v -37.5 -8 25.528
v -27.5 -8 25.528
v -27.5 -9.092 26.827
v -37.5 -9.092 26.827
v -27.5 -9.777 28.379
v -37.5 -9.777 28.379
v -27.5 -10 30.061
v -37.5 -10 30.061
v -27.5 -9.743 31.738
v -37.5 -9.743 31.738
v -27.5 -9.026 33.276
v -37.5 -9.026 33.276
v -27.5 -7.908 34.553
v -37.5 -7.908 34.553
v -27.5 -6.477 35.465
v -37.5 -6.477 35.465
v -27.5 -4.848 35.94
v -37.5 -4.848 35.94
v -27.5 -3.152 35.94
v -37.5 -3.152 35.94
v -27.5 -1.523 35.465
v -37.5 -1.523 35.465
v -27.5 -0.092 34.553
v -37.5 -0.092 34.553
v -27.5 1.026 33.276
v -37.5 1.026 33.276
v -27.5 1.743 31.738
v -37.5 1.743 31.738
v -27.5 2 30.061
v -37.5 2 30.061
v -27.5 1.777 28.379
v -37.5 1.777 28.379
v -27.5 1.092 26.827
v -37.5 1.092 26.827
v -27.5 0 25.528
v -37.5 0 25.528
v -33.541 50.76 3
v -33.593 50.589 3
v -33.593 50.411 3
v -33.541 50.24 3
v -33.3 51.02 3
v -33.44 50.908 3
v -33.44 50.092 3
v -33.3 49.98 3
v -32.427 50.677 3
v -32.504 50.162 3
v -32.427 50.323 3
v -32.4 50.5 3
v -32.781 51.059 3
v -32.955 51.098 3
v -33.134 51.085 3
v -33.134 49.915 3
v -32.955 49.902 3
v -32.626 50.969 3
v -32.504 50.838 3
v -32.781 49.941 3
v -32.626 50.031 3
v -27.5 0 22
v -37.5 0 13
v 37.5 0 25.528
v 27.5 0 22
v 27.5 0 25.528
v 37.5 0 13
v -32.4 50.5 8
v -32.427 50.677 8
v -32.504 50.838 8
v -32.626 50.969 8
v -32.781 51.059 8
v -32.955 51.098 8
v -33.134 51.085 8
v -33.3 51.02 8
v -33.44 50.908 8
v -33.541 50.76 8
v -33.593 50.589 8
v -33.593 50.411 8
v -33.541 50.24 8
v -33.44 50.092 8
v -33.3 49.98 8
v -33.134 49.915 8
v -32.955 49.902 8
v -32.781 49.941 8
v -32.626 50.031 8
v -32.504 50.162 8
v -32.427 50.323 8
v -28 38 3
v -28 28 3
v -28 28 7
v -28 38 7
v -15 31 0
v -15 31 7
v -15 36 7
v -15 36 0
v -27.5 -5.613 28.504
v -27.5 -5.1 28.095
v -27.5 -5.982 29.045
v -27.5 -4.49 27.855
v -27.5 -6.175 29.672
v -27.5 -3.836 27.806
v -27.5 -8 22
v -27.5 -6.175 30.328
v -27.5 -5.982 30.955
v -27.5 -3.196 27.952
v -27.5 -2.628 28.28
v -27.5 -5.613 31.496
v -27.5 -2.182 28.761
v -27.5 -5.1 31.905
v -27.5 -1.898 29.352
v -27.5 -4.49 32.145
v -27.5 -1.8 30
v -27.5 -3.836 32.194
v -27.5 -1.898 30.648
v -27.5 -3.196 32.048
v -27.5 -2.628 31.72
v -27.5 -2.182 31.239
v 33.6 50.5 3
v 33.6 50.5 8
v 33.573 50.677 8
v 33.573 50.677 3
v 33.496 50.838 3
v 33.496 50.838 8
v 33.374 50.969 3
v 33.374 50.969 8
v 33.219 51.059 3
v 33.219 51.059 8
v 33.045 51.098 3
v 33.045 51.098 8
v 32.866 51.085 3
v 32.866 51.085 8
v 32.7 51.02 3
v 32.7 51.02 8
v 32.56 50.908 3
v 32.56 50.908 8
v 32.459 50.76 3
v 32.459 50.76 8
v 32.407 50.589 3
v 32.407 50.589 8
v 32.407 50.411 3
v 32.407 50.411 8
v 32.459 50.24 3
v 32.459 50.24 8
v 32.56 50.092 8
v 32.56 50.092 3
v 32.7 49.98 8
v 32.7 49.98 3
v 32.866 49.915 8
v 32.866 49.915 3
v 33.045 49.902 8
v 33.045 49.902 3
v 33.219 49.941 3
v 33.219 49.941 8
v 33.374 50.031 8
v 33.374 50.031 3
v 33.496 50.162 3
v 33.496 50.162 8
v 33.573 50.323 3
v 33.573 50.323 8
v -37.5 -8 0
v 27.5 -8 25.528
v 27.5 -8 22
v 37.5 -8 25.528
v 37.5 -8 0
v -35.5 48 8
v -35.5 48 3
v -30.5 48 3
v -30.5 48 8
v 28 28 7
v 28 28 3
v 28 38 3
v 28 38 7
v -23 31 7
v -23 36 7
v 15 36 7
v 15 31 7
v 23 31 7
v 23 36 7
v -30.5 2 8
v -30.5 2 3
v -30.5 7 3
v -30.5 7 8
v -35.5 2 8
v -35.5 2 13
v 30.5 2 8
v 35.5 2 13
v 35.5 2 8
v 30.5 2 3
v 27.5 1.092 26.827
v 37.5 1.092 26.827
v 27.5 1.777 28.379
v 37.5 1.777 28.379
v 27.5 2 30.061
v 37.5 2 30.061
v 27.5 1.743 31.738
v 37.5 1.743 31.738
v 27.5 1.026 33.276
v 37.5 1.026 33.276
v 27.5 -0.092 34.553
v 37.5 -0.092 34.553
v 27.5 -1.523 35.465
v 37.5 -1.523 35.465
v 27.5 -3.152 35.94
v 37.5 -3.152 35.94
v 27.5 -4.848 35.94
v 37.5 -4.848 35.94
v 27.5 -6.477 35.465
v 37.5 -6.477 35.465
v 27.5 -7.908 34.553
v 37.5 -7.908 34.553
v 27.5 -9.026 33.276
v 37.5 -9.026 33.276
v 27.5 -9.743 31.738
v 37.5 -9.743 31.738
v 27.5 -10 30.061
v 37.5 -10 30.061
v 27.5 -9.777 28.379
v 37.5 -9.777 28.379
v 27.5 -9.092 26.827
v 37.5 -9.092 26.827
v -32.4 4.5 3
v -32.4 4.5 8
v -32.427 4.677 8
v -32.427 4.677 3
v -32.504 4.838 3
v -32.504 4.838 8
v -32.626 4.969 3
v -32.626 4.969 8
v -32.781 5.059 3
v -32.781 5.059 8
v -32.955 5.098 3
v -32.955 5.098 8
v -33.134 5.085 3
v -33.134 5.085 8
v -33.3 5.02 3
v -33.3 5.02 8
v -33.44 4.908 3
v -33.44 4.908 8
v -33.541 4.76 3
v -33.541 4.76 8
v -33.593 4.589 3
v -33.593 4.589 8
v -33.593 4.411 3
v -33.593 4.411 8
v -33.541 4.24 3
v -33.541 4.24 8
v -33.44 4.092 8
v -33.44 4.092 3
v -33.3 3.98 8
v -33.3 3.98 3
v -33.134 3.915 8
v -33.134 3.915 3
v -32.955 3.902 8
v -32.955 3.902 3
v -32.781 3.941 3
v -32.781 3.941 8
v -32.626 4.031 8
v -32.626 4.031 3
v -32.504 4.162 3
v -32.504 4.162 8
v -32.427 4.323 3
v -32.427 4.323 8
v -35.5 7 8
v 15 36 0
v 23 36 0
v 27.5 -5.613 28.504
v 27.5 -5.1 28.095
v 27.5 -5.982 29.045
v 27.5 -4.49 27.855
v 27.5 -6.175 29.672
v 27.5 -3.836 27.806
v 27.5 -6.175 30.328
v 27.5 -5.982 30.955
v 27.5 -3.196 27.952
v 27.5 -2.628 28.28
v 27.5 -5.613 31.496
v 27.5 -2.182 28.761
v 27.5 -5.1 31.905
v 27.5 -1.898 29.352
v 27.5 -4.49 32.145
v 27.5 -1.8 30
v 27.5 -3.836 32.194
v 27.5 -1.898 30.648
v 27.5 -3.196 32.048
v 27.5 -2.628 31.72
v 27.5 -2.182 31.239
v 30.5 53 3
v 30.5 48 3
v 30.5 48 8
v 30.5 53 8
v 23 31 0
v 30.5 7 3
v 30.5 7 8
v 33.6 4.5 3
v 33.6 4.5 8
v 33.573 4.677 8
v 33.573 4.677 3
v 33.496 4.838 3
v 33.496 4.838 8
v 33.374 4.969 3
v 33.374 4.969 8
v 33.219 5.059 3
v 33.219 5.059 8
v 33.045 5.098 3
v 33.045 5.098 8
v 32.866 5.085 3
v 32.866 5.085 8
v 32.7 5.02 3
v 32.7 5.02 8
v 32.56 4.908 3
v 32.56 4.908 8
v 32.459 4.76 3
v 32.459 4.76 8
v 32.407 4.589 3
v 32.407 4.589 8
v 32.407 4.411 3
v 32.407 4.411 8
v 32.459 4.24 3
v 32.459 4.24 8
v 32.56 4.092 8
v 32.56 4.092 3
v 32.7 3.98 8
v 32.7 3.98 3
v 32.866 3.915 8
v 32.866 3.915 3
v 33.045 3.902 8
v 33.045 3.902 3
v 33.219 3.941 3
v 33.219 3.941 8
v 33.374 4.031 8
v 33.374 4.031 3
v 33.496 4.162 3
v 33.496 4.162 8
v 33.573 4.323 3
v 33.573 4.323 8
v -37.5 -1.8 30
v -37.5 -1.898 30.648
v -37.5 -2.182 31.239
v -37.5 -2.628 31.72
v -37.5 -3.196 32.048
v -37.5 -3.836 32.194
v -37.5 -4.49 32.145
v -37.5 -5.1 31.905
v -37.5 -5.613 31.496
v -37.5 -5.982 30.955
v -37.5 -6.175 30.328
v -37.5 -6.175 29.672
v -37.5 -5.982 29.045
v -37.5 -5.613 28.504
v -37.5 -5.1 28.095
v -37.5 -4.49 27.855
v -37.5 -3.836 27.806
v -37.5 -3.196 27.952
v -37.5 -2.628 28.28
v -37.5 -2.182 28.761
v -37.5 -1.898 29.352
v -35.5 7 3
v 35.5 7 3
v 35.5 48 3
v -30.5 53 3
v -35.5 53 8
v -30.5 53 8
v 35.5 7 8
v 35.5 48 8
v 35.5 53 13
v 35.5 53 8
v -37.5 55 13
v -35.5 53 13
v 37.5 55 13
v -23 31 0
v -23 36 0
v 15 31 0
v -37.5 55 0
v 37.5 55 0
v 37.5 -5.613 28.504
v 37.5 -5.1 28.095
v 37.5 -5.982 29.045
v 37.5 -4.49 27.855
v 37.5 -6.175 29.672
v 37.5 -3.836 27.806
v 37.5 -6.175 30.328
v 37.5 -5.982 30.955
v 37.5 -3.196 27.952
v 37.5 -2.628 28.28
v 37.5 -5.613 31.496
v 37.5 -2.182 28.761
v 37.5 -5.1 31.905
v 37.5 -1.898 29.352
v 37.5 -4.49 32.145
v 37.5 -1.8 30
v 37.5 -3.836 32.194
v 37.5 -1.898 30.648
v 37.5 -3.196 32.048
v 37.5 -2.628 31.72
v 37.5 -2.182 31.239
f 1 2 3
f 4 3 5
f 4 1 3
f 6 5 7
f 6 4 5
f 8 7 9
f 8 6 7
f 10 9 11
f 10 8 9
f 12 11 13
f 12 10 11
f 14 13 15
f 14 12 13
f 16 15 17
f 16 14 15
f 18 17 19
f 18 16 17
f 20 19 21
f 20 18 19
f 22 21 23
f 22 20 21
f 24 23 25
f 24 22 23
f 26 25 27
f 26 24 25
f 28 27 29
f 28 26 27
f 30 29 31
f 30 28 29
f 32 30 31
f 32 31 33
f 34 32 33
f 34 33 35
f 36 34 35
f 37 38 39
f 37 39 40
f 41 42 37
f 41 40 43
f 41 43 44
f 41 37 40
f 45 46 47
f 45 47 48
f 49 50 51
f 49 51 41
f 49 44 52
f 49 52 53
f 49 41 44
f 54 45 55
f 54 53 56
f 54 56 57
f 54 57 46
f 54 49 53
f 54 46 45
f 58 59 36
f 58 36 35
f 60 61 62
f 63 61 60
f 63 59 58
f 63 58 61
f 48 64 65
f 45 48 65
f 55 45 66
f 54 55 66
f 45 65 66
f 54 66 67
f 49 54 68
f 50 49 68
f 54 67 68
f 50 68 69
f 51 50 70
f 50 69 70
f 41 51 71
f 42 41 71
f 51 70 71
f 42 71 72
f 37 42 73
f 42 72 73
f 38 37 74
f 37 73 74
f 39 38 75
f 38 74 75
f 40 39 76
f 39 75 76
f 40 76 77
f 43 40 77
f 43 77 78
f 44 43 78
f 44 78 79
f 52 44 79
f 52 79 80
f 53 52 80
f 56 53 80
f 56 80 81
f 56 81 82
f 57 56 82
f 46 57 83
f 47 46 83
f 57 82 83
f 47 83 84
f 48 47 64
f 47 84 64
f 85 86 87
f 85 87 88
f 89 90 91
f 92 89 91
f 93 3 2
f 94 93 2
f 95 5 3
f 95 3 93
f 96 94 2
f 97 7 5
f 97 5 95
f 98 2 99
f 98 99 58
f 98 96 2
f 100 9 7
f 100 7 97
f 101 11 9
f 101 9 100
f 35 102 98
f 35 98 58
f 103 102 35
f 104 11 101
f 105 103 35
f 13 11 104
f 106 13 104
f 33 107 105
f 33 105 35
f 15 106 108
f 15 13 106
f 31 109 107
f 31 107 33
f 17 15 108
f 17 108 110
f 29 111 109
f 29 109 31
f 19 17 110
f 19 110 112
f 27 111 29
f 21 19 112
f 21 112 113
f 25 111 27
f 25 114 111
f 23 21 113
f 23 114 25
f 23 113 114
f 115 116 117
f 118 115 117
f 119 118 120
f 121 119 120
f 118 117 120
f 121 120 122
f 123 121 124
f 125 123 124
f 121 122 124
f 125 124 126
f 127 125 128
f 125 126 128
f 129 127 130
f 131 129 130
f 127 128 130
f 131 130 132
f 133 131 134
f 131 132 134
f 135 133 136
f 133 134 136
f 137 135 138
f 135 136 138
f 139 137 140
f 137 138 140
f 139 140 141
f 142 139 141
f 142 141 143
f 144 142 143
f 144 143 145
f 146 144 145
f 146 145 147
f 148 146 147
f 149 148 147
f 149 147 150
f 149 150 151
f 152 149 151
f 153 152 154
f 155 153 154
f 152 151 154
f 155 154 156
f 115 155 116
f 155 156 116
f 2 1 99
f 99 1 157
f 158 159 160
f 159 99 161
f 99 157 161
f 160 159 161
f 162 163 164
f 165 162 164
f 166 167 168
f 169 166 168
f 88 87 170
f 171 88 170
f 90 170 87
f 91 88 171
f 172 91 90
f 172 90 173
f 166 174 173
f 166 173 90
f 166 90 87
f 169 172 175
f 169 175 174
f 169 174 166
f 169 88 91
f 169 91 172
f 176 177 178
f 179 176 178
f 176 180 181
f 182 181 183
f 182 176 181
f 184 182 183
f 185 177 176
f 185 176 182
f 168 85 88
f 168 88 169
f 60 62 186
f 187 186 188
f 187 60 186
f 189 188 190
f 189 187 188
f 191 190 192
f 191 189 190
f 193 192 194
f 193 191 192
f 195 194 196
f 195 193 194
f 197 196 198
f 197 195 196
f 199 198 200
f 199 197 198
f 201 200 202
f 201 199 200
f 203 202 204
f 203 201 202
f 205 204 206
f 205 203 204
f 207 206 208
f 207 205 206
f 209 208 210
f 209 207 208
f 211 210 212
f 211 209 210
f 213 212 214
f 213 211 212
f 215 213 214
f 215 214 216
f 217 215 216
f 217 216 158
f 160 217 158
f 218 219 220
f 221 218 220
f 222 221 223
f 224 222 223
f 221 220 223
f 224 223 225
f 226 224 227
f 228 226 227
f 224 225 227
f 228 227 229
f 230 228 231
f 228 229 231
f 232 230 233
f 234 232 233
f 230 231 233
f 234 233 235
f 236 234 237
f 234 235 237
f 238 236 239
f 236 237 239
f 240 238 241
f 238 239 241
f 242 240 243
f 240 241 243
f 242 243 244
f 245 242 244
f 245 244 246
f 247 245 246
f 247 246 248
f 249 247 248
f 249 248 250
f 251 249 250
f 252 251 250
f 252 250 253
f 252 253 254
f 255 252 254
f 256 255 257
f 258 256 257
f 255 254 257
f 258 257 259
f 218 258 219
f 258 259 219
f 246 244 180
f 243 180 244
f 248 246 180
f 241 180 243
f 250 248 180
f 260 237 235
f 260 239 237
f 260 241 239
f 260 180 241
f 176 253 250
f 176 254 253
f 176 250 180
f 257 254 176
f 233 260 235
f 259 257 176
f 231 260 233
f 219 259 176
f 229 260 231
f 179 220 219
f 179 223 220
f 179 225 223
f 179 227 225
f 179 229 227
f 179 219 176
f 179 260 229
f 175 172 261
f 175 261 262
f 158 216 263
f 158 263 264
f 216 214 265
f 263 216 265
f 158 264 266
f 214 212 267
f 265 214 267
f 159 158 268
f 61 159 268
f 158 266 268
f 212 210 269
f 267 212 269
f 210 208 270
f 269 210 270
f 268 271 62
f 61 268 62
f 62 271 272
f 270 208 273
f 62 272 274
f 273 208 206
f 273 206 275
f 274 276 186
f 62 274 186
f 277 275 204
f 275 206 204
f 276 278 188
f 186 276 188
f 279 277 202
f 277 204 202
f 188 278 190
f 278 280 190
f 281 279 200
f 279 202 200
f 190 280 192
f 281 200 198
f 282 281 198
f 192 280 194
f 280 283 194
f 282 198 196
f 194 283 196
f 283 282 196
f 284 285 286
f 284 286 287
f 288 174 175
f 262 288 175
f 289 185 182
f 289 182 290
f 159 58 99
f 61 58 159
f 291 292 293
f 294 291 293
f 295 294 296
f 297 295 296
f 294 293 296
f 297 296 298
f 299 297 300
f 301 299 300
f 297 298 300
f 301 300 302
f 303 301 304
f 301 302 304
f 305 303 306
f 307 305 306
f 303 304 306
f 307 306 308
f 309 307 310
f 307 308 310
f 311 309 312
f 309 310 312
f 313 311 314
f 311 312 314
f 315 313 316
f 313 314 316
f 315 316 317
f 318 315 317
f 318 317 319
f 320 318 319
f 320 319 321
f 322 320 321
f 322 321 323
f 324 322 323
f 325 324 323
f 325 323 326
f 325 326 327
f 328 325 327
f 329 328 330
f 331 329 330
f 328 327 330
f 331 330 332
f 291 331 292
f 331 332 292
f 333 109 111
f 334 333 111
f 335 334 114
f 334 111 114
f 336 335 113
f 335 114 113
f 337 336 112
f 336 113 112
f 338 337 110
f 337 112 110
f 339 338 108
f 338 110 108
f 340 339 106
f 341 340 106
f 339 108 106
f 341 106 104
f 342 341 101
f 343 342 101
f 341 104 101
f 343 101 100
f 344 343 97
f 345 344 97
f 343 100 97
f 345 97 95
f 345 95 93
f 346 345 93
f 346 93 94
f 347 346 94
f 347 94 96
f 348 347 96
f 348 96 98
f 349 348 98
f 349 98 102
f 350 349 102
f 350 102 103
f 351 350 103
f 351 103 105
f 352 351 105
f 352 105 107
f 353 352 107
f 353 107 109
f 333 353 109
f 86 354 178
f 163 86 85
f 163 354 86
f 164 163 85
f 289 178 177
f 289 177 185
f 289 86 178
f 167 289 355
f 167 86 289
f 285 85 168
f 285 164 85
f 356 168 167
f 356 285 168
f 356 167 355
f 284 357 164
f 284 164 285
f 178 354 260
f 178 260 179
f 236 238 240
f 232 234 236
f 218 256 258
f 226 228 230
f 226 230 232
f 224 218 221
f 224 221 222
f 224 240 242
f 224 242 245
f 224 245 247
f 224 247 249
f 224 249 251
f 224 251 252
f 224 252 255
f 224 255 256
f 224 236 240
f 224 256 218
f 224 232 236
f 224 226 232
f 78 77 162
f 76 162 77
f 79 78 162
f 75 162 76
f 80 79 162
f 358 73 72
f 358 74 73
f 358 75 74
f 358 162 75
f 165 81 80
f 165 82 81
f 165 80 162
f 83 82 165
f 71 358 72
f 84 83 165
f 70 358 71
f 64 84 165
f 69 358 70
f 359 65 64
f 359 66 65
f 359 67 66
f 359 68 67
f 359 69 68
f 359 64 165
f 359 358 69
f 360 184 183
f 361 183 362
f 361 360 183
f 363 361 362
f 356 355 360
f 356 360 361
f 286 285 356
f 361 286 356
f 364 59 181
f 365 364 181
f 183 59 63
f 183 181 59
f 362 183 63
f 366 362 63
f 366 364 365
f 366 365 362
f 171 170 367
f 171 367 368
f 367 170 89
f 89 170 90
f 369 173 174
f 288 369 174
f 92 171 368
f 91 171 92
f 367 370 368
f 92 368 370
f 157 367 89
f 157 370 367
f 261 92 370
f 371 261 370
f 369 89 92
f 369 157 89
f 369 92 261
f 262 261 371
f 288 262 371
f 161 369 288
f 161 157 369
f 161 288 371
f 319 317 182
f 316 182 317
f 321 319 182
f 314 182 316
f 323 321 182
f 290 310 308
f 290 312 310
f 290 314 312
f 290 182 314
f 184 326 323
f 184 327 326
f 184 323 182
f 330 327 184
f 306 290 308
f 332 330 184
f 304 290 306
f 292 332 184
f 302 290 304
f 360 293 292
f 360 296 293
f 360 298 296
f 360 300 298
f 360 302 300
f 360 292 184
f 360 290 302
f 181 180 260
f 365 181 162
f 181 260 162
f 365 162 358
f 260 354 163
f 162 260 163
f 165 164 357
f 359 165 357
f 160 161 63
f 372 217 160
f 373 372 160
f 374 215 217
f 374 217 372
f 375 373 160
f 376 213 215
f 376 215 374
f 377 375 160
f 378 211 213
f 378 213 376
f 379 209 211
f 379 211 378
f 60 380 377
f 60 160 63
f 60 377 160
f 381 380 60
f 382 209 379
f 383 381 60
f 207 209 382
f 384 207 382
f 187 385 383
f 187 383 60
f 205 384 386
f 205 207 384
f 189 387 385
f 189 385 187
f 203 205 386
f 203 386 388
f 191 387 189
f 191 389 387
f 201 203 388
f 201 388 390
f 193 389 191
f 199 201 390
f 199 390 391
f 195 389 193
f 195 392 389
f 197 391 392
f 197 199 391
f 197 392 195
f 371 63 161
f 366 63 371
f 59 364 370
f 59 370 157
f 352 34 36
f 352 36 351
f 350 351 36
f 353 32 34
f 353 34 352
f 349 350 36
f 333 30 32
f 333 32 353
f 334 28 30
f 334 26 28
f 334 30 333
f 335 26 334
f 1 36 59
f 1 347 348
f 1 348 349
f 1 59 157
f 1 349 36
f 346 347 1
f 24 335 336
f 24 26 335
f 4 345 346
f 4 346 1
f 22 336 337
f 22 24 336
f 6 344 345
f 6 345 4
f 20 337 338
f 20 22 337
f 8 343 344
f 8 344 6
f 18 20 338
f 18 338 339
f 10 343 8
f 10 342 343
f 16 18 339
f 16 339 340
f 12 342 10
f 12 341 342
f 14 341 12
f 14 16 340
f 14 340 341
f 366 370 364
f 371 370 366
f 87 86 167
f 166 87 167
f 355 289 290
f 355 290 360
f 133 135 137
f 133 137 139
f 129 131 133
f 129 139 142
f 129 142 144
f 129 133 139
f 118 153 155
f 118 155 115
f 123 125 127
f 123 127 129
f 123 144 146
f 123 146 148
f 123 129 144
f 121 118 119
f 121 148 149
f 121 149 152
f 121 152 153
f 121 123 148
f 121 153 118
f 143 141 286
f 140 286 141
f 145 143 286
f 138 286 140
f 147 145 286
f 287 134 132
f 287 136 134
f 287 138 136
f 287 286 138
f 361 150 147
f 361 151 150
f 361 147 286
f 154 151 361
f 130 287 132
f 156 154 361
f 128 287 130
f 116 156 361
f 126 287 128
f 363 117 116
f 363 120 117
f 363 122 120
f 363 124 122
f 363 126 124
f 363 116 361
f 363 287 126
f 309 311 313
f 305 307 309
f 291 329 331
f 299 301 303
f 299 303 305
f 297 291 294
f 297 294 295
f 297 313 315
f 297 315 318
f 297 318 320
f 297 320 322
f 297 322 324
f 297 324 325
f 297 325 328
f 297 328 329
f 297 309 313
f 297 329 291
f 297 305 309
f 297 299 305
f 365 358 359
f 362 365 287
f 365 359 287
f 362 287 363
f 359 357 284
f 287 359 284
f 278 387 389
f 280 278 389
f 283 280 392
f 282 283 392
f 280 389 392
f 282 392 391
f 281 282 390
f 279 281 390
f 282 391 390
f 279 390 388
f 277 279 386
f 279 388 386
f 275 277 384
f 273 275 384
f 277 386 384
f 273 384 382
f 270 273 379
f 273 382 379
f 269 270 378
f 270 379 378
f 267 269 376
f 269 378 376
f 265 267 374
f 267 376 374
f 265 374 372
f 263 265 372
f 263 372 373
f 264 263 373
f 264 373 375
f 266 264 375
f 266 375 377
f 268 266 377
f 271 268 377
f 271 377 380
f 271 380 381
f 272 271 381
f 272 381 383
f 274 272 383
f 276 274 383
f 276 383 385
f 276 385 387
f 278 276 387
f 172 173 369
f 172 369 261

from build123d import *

# Parameters (mm, degrees)
SKETCH_W        = 75
SKETCH_H        = 55
PAD_DEPTH       = 3
SKETCH001_W     = 75
SKETCH001_H     = 55
SKETCH001_W_2   = 71
SKETCH001_H_2   = 51
PAD001_DEPTH    = 10
SKETCH002_W     = 5
SKETCH002_H     = 5
PAD002_DEPTH    = 5
SKETCH011_R     = 0.6
POCKET004_DEPTH = 5
SKETCH012_W     = 56
SKETCH012_H     = 10
PAD003_DEPTH    = 4
SKETCH013_W     = 8
SKETCH013_H     = 5
POCKET_DEPTH    = 8
SKETCH014_W     = 75
SKETCH014_H     = 8
PAD004_DEPTH    = 30
SKETCH015_R     = 6
PAD005_DEPTH    = 10
SKETCH016_R     = 6
PAD006_DEPTH    = 10
SKETCH017_R     = 2.2
POCKET005_DEPTH = 75
SKETCH018_W     = 55
SKETCH018_H     = 8
POCKET006_DEPTH = 8


with BuildPart() as part:
    # Sketch → Pad (new body)
    with BuildSketch(Plane.XY):
        with Locations((0, 27.5)):
            Rectangle(SKETCH_W, SKETCH_H)
    extrude(amount=PAD_DEPTH)

    # Sketch001 (on Face6 of Pad) → Pad001 (join)
    with BuildSketch(Plane.XY.offset(3)):
        with Locations((0, 27.5)):
            Rectangle(SKETCH001_W, SKETCH001_H)
        with Locations((0, 27.5)):
            Rectangle(SKETCH001_W_2, SKETCH001_H_2, mode=Mode.SUBTRACT)
    extrude(amount=PAD001_DEPTH)

    # Sketch002 (on Face15 of Pad001) → Pad002 (join)
    with BuildSketch(Plane.XY.offset(3)):
        with Locations((-33, 50.5)):
            Rectangle(SKETCH002_W, SKETCH002_H)
        with Locations((33, 50.5)):
            Rectangle(SKETCH002_W, SKETCH002_H)
        with Locations((33, 4.5)):
            Rectangle(SKETCH002_W, SKETCH002_H)
        with Locations((-33, 4.5)):
            Rectangle(SKETCH002_W, SKETCH002_H)
    extrude(amount=PAD002_DEPTH)

    # Sketch011 → Pocket004 (cut)
    with BuildSketch(Plane.XY.offset(8)):
        with Locations((-33, 4.5)):
            Circle(SKETCH011_R)
        with Locations((33, 4.5)):
            Circle(SKETCH011_R)
        with Locations((-33, 50.5)):
            Circle(SKETCH011_R)
        with Locations((33, 50.5)):
            Circle(SKETCH011_R)
    extrude(amount=-POCKET004_DEPTH, mode=Mode.SUBTRACT)

    # Sketch012 (on Face17 of Pocket004) → Pad003 (join)
    with BuildSketch(Plane.XY.offset(3)):
        with Locations((0, 33)):
            Rectangle(SKETCH012_W, SKETCH012_H)
    extrude(amount=PAD003_DEPTH)

    # Sketch013 (on Face37 of Pad003) → Pocket (cut)
    with BuildSketch(Plane.XY.offset(7)):
        with Locations((-19, 33.5)):
            Rectangle(SKETCH013_W, SKETCH013_H)
        with Locations((19, 33.5)):
            Rectangle(SKETCH013_W, SKETCH013_H)
    extrude(amount=-POCKET_DEPTH, mode=Mode.SUBTRACT)

    # Sketch014 (on Face4 of Pocket) → Pad004 (join)
    with BuildSketch(Plane(origin=(0, 0, 0), x_dir=(1, 0, 0), z_dir=(0, 0, -1))):
        with Locations((0, 4)):
            Rectangle(SKETCH014_W, SKETCH014_H)
    extrude(amount=-PAD004_DEPTH)

    # Sketch015 (on Face6 of Pad004) → Pad005 (join)
    with BuildSketch(Plane(origin=(-37.5, 0, 0), x_dir=(0, -1, 0), z_dir=(-1, 0, 0))):
        with Locations((4, 30)):
            Circle(SKETCH015_R)
    extrude(amount=-PAD005_DEPTH)

    # Sketch016 (on Face8 of Pad005) → Pad006 (join)
    with BuildSketch(Plane.YZ.offset(37.5)):
        with Locations((-4, 30)):
            Circle(SKETCH016_R)
    extrude(amount=-PAD006_DEPTH)

    # Sketch017 (on Face37 of Pad006) → Pocket005 (cut)
    with BuildSketch(Plane.YZ.offset(37.5)):
        with Locations((-4, 30)):
            Circle(SKETCH017_R)
    extrude(amount=-POCKET005_DEPTH, mode=Mode.SUBTRACT)

    # Sketch018 (on Face37 of Pocket005) → Pocket006 (cut)
    with BuildSketch(Plane.XY.offset(30)):
        with Locations((0, -4)):
            Rectangle(SKETCH018_W, SKETCH018_H)
    extrude(amount=-POCKET006_DEPTH, mode=Mode.SUBTRACT)


solid = part.part
